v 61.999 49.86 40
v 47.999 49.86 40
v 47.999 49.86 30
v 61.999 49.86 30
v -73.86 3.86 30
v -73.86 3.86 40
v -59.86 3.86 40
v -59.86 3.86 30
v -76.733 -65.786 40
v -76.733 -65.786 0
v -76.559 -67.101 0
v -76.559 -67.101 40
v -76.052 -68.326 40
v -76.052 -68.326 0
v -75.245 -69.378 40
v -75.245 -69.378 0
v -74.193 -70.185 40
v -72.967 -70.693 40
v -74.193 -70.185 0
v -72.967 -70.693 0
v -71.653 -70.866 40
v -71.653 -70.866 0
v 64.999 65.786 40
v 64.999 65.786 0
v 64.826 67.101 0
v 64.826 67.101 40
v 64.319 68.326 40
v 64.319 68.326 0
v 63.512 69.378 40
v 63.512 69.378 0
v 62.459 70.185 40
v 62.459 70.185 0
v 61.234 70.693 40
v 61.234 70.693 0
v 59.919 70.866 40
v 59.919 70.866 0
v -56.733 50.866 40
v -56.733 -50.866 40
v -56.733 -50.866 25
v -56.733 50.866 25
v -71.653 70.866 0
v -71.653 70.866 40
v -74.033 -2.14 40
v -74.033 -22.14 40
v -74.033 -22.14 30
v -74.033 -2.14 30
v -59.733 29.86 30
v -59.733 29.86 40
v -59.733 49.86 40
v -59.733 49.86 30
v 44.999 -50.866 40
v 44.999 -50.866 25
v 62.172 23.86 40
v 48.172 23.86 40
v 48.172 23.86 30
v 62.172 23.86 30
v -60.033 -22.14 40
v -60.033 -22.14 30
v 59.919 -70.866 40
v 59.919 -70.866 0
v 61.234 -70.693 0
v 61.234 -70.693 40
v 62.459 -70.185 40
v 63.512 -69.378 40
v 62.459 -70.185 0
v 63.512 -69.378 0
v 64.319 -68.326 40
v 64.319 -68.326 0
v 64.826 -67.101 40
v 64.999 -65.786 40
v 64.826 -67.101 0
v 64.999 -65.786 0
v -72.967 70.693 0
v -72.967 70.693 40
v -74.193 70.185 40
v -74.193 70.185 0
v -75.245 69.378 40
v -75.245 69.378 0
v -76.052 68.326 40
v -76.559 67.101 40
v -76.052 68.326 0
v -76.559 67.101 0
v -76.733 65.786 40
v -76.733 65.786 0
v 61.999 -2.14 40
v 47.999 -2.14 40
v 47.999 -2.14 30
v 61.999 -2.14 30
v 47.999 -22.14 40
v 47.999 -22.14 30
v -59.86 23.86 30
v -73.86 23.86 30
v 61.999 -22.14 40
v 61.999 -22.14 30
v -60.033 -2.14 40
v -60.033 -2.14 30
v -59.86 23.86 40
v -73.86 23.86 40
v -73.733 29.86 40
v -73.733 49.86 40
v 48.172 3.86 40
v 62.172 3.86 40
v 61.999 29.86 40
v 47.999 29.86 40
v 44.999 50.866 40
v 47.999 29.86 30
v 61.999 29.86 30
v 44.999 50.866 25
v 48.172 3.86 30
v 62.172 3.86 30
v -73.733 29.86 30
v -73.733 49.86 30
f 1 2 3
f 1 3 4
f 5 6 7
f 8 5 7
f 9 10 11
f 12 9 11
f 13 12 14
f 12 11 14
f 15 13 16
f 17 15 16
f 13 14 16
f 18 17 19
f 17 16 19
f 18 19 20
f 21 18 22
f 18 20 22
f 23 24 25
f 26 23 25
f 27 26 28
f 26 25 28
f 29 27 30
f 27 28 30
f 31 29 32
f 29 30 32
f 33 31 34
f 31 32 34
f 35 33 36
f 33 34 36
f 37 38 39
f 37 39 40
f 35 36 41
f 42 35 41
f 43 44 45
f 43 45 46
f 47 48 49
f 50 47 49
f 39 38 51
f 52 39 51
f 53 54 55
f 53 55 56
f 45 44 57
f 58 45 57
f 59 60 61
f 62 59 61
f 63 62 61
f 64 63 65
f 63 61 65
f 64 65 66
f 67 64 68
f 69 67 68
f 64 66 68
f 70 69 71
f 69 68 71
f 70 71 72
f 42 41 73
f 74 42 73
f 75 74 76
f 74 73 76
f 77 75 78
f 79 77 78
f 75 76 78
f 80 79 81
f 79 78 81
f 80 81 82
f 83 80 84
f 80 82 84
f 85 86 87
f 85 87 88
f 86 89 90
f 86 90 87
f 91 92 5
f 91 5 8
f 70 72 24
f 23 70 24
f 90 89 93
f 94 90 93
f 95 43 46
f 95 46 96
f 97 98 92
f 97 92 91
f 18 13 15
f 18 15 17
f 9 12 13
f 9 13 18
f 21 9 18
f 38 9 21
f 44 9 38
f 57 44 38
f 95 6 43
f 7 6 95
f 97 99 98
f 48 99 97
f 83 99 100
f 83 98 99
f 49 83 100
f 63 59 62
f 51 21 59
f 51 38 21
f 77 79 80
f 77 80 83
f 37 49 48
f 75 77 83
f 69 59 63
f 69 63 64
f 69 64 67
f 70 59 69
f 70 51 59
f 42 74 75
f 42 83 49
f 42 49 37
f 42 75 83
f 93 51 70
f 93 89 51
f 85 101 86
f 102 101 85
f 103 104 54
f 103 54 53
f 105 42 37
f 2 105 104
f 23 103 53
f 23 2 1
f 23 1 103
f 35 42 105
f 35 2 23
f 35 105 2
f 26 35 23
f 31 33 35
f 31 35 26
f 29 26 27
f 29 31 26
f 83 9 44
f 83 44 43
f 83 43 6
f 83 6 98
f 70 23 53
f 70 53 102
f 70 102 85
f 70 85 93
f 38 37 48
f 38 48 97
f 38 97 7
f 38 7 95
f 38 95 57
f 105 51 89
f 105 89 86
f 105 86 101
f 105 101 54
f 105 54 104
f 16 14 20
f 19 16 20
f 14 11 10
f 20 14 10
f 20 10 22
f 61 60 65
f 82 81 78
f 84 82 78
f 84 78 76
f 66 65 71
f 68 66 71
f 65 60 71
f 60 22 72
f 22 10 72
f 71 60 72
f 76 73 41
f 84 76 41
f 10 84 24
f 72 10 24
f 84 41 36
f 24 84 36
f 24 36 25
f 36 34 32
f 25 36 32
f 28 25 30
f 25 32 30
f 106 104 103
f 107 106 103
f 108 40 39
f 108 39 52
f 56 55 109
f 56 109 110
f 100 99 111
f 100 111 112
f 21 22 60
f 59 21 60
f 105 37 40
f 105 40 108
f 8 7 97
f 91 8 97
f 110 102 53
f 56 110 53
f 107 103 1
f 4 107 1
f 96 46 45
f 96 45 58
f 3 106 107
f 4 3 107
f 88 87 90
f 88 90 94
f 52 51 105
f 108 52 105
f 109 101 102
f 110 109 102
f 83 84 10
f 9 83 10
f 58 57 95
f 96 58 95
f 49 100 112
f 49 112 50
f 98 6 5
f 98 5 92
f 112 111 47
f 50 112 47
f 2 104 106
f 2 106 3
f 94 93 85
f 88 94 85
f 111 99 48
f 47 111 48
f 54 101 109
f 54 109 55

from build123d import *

# Parameters (mm, degrees)
F1_DEPTH = 40
F2_W     = 101.732
F2_H     = 101.732004
F3_DEPTH = 15
F4_W     = 14
F4_H     = 20
F5_DEPTH = 10


with BuildPart() as f1:
    # F0 (on Top) → F1 (new body)
    with BuildSketch(Plane.XY):
        with BuildLine():
            Line((59.91943, 70.866002), (-71.65257, 70.866002))
            ThreePointArc((-71.65257, 70.866002), (-75.244673, 69.378105), (-76.73257, 65.786002))
            Line((-76.73257, 65.786002), (-76.73257, -65.786002))
            ThreePointArc((-76.73257, -65.786002), (-75.244673, -69.378105), (-71.65257, -70.866002))
            Line((-71.65257, -70.866002), (59.91943, -70.866002))
            ThreePointArc((59.91943, -70.866002), (63.511532, -69.378105), (64.99943, -65.786002))
            Line((64.99943, -65.786002), (64.99943, 65.786002))
            ThreePointArc((64.99943, 65.786002), (63.511532, 69.378105), (59.91943, 70.866002))
        make_face()
    extrude(amount=F1_DEPTH)

    # F2 (on face) → F3 (cut)
    with BuildSketch(Plane.XY.offset(40)):
        with Locations((-5.86657, 0)):
            Rectangle(F2_W, F2_H)
    extrude(amount=-F3_DEPTH, mode=Mode.SUBTRACT)

    # F4 (on face) → F5 (cut)
    with BuildSketch(Plane.XY.offset(40)):
        with Locations((-66.73257, 39.860209)):
            Rectangle(F4_W, F4_H)
        with Locations((-66.859915, 13.860209)):
            Rectangle(F4_W, F4_H)
        with Locations((-67.03256, -12.139791)):
            Rectangle(F4_W, F4_H)
        with Locations((54.99943, 39.860209)):
            Rectangle(F4_W, F4_H)
        with Locations((55.172075, 13.860209)):
            Rectangle(F4_W, F4_H)
        with Locations((54.99943, -12.139791)):
            Rectangle(F4_W, F4_H)
    extrude(amount=-F5_DEPTH, mode=Mode.SUBTRACT)


solid = f1.part
